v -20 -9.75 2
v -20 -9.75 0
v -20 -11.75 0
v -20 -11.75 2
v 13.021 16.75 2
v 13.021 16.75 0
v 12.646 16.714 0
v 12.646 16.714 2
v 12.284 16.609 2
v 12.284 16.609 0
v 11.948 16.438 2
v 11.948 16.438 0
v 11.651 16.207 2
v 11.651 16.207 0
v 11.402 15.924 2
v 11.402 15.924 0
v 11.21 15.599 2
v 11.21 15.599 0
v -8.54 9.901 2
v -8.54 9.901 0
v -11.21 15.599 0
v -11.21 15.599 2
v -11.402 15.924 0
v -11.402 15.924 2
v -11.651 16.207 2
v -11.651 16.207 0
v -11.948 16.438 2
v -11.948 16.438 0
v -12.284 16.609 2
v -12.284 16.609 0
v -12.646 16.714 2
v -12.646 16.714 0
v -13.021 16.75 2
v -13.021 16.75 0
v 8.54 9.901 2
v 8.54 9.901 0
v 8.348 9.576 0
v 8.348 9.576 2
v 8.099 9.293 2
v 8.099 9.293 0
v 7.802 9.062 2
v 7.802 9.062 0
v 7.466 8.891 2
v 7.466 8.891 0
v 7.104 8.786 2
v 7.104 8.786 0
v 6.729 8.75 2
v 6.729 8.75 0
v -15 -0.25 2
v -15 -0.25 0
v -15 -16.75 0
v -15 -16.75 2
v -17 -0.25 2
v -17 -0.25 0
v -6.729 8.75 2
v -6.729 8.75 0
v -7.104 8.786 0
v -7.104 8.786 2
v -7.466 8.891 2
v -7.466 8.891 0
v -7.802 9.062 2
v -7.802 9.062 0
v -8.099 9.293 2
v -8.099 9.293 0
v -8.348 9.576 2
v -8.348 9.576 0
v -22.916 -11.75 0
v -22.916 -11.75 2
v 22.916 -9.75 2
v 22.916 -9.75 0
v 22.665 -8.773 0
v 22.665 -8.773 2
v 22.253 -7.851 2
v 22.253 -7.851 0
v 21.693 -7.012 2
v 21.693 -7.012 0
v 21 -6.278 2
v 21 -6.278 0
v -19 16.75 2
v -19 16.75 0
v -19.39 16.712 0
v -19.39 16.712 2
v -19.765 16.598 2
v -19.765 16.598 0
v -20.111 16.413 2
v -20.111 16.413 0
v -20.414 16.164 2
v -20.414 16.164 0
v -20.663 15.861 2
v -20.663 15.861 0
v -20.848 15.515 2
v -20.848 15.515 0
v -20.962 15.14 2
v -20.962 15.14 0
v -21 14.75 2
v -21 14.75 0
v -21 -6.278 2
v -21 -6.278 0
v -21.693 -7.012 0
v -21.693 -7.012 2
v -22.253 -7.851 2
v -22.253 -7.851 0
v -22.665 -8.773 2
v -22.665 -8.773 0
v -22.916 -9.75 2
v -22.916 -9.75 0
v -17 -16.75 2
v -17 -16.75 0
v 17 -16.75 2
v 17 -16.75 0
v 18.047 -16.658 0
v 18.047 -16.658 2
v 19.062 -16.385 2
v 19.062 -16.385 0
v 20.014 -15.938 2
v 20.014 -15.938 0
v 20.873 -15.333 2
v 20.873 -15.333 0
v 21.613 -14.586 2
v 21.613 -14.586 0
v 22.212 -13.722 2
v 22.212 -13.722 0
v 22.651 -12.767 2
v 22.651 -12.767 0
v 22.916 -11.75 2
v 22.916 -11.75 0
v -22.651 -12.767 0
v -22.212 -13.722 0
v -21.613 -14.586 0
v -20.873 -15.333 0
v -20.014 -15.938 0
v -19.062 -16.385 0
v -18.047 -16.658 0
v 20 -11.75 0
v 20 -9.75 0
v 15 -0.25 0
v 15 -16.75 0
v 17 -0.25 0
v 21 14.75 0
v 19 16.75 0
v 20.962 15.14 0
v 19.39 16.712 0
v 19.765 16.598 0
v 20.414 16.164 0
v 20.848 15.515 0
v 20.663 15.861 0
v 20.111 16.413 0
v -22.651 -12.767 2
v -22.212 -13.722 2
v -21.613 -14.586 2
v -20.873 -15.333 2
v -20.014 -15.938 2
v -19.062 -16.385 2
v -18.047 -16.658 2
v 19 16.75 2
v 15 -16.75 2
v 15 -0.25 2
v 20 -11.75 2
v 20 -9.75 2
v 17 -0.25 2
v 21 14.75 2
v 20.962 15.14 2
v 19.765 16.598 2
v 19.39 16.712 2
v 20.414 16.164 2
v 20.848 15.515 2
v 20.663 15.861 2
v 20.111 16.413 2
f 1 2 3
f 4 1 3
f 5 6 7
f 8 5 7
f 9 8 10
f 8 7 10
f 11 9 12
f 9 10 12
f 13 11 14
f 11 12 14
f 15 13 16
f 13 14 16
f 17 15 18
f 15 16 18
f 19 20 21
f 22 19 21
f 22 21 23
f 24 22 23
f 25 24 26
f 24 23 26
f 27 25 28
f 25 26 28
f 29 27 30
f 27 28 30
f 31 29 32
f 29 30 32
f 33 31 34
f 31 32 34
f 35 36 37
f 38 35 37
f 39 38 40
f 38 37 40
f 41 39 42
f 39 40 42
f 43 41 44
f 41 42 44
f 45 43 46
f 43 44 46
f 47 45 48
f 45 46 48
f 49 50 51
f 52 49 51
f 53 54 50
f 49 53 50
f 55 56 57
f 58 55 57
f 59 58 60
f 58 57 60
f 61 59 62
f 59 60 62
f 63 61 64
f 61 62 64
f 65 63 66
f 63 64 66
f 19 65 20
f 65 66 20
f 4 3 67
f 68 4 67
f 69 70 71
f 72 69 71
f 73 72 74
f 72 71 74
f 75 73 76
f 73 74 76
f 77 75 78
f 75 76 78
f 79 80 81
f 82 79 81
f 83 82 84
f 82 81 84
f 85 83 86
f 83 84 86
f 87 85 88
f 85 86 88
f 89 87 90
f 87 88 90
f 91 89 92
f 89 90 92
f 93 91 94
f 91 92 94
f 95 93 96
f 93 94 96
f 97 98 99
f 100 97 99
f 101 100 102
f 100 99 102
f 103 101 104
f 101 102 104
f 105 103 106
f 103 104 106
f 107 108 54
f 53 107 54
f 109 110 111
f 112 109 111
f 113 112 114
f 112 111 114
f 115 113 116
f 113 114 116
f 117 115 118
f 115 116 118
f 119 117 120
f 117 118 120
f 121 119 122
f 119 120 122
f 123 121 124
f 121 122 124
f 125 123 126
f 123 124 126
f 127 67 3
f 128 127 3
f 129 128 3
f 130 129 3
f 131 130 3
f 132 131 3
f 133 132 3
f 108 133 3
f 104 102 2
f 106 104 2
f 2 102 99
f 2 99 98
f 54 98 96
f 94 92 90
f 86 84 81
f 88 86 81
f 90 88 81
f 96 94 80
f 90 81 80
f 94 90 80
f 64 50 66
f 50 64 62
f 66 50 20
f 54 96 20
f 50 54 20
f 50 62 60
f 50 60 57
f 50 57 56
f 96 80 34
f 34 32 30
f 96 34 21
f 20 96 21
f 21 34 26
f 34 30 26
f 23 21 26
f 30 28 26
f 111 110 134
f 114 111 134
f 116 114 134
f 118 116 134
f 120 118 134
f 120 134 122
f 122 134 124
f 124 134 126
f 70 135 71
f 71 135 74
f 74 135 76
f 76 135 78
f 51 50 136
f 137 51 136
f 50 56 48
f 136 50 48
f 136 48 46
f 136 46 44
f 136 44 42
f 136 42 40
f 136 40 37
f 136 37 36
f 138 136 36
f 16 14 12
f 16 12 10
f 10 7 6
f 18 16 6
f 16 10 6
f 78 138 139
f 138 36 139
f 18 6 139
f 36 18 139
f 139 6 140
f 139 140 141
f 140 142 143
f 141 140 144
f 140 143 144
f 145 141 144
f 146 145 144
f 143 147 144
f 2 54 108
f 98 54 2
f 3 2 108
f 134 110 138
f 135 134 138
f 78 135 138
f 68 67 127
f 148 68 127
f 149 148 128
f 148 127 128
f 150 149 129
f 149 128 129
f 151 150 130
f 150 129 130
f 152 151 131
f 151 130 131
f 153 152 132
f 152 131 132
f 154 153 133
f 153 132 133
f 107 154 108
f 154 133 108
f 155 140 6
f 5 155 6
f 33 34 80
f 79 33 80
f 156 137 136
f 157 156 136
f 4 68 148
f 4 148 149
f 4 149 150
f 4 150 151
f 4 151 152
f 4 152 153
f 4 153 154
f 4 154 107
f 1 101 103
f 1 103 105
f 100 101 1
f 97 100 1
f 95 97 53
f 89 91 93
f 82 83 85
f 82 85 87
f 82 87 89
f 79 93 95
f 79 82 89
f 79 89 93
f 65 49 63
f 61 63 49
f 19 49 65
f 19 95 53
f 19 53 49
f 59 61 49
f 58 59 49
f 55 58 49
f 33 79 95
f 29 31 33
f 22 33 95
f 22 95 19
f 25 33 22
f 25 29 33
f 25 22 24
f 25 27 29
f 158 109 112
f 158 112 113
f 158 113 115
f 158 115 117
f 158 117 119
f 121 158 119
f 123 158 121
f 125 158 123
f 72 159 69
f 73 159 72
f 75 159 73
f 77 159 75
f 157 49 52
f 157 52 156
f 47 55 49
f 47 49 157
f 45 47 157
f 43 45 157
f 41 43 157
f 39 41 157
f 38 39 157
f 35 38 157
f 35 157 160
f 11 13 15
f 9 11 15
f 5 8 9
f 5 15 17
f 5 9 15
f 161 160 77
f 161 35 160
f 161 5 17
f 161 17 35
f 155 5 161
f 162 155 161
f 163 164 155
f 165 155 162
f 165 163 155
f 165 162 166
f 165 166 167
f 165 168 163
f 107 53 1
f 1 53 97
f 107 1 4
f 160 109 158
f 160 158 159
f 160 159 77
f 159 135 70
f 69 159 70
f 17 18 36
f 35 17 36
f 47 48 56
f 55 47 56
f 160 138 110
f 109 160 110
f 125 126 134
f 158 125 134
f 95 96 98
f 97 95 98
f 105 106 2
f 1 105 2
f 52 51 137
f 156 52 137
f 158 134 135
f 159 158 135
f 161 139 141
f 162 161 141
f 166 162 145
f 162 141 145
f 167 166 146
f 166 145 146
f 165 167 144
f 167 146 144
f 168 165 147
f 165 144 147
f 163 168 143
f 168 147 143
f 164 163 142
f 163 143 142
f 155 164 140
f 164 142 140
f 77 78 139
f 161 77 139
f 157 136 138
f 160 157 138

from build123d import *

# Parameters (mm, degrees)
F1_DEPTH = 2


with BuildPart() as f1:
    # F0 (on Top) → F1 (new body)
    with BuildSketch(Plane.XY):
        with BuildLine():
            Line((-13.021325, 16.75), (-19, 16.75))
            ThreePointArc((-19, 16.75), (-20.414214, 16.164214), (-21, 14.75))
            Line((-21, 14.75), (-21, -6.277864))
            ThreePointArc((-21, -6.277864), (-22.253198, -7.85105), (-22.91608, -9.75))
            Line((-22.91608, -9.75), (-20, -9.75))
            Line((-20, -9.75), (-20, -11.75))
            Line((-20, -11.75), (-22.91608, -11.75))
            ThreePointArc((-22.91608, -11.75), (-20.872983, -15.332576), (-17, -16.75))
            Line((-17, -16.75), (-17, -0.25))
            Line((-17, -0.25), (-15, -0.25))
            Line((-15, -0.25), (-15, -16.75))
            Line((-15, -16.75), (15, -16.75))
            Line((15, -16.75), (15, -0.25))
            Line((15, -0.25), (17, -0.25))
            Line((17, -0.25), (17, -16.75))
            ThreePointArc((17, -16.75), (20.872983, -15.332576), (22.91608, -11.75))
            Line((22.91608, -11.75), (20, -11.75))
            Line((20, -11.75), (20, -9.75))
            Line((20, -9.75), (22.91608, -9.75))
            ThreePointArc((22.91608, -9.75), (22.253198, -7.85105), (21, -6.277864))
            Line((21, -6.277864), (21, 14.75))
            ThreePointArc((21, 14.75), (20.414214, 16.164214), (19, 16.75))
            Line((19, 16.75), (13.021325, 16.75))
            ThreePointArc((13.021325, 16.75), (11.948416, 16.437859), (11.210407, 15.598868))
            Line((11.210407, 15.598868), (8.539593, 9.901132))
            ThreePointArc((8.539593, 9.901132), (7.801584, 9.062141), (6.728675, 8.75))
            Line((6.728675, 8.75), (-6.728675, 8.75))
            ThreePointArc((-6.728675, 8.75), (-7.801584, 9.062141), (-8.539593, 9.901132))
            Line((-8.539593, 9.901132), (-11.210407, 15.598868))
            ThreePointArc((-11.210407, 15.598868), (-11.948416, 16.437859), (-13.021325, 16.75))
        make_face()
    extrude(amount=F1_DEPTH)


solid = f1.part
